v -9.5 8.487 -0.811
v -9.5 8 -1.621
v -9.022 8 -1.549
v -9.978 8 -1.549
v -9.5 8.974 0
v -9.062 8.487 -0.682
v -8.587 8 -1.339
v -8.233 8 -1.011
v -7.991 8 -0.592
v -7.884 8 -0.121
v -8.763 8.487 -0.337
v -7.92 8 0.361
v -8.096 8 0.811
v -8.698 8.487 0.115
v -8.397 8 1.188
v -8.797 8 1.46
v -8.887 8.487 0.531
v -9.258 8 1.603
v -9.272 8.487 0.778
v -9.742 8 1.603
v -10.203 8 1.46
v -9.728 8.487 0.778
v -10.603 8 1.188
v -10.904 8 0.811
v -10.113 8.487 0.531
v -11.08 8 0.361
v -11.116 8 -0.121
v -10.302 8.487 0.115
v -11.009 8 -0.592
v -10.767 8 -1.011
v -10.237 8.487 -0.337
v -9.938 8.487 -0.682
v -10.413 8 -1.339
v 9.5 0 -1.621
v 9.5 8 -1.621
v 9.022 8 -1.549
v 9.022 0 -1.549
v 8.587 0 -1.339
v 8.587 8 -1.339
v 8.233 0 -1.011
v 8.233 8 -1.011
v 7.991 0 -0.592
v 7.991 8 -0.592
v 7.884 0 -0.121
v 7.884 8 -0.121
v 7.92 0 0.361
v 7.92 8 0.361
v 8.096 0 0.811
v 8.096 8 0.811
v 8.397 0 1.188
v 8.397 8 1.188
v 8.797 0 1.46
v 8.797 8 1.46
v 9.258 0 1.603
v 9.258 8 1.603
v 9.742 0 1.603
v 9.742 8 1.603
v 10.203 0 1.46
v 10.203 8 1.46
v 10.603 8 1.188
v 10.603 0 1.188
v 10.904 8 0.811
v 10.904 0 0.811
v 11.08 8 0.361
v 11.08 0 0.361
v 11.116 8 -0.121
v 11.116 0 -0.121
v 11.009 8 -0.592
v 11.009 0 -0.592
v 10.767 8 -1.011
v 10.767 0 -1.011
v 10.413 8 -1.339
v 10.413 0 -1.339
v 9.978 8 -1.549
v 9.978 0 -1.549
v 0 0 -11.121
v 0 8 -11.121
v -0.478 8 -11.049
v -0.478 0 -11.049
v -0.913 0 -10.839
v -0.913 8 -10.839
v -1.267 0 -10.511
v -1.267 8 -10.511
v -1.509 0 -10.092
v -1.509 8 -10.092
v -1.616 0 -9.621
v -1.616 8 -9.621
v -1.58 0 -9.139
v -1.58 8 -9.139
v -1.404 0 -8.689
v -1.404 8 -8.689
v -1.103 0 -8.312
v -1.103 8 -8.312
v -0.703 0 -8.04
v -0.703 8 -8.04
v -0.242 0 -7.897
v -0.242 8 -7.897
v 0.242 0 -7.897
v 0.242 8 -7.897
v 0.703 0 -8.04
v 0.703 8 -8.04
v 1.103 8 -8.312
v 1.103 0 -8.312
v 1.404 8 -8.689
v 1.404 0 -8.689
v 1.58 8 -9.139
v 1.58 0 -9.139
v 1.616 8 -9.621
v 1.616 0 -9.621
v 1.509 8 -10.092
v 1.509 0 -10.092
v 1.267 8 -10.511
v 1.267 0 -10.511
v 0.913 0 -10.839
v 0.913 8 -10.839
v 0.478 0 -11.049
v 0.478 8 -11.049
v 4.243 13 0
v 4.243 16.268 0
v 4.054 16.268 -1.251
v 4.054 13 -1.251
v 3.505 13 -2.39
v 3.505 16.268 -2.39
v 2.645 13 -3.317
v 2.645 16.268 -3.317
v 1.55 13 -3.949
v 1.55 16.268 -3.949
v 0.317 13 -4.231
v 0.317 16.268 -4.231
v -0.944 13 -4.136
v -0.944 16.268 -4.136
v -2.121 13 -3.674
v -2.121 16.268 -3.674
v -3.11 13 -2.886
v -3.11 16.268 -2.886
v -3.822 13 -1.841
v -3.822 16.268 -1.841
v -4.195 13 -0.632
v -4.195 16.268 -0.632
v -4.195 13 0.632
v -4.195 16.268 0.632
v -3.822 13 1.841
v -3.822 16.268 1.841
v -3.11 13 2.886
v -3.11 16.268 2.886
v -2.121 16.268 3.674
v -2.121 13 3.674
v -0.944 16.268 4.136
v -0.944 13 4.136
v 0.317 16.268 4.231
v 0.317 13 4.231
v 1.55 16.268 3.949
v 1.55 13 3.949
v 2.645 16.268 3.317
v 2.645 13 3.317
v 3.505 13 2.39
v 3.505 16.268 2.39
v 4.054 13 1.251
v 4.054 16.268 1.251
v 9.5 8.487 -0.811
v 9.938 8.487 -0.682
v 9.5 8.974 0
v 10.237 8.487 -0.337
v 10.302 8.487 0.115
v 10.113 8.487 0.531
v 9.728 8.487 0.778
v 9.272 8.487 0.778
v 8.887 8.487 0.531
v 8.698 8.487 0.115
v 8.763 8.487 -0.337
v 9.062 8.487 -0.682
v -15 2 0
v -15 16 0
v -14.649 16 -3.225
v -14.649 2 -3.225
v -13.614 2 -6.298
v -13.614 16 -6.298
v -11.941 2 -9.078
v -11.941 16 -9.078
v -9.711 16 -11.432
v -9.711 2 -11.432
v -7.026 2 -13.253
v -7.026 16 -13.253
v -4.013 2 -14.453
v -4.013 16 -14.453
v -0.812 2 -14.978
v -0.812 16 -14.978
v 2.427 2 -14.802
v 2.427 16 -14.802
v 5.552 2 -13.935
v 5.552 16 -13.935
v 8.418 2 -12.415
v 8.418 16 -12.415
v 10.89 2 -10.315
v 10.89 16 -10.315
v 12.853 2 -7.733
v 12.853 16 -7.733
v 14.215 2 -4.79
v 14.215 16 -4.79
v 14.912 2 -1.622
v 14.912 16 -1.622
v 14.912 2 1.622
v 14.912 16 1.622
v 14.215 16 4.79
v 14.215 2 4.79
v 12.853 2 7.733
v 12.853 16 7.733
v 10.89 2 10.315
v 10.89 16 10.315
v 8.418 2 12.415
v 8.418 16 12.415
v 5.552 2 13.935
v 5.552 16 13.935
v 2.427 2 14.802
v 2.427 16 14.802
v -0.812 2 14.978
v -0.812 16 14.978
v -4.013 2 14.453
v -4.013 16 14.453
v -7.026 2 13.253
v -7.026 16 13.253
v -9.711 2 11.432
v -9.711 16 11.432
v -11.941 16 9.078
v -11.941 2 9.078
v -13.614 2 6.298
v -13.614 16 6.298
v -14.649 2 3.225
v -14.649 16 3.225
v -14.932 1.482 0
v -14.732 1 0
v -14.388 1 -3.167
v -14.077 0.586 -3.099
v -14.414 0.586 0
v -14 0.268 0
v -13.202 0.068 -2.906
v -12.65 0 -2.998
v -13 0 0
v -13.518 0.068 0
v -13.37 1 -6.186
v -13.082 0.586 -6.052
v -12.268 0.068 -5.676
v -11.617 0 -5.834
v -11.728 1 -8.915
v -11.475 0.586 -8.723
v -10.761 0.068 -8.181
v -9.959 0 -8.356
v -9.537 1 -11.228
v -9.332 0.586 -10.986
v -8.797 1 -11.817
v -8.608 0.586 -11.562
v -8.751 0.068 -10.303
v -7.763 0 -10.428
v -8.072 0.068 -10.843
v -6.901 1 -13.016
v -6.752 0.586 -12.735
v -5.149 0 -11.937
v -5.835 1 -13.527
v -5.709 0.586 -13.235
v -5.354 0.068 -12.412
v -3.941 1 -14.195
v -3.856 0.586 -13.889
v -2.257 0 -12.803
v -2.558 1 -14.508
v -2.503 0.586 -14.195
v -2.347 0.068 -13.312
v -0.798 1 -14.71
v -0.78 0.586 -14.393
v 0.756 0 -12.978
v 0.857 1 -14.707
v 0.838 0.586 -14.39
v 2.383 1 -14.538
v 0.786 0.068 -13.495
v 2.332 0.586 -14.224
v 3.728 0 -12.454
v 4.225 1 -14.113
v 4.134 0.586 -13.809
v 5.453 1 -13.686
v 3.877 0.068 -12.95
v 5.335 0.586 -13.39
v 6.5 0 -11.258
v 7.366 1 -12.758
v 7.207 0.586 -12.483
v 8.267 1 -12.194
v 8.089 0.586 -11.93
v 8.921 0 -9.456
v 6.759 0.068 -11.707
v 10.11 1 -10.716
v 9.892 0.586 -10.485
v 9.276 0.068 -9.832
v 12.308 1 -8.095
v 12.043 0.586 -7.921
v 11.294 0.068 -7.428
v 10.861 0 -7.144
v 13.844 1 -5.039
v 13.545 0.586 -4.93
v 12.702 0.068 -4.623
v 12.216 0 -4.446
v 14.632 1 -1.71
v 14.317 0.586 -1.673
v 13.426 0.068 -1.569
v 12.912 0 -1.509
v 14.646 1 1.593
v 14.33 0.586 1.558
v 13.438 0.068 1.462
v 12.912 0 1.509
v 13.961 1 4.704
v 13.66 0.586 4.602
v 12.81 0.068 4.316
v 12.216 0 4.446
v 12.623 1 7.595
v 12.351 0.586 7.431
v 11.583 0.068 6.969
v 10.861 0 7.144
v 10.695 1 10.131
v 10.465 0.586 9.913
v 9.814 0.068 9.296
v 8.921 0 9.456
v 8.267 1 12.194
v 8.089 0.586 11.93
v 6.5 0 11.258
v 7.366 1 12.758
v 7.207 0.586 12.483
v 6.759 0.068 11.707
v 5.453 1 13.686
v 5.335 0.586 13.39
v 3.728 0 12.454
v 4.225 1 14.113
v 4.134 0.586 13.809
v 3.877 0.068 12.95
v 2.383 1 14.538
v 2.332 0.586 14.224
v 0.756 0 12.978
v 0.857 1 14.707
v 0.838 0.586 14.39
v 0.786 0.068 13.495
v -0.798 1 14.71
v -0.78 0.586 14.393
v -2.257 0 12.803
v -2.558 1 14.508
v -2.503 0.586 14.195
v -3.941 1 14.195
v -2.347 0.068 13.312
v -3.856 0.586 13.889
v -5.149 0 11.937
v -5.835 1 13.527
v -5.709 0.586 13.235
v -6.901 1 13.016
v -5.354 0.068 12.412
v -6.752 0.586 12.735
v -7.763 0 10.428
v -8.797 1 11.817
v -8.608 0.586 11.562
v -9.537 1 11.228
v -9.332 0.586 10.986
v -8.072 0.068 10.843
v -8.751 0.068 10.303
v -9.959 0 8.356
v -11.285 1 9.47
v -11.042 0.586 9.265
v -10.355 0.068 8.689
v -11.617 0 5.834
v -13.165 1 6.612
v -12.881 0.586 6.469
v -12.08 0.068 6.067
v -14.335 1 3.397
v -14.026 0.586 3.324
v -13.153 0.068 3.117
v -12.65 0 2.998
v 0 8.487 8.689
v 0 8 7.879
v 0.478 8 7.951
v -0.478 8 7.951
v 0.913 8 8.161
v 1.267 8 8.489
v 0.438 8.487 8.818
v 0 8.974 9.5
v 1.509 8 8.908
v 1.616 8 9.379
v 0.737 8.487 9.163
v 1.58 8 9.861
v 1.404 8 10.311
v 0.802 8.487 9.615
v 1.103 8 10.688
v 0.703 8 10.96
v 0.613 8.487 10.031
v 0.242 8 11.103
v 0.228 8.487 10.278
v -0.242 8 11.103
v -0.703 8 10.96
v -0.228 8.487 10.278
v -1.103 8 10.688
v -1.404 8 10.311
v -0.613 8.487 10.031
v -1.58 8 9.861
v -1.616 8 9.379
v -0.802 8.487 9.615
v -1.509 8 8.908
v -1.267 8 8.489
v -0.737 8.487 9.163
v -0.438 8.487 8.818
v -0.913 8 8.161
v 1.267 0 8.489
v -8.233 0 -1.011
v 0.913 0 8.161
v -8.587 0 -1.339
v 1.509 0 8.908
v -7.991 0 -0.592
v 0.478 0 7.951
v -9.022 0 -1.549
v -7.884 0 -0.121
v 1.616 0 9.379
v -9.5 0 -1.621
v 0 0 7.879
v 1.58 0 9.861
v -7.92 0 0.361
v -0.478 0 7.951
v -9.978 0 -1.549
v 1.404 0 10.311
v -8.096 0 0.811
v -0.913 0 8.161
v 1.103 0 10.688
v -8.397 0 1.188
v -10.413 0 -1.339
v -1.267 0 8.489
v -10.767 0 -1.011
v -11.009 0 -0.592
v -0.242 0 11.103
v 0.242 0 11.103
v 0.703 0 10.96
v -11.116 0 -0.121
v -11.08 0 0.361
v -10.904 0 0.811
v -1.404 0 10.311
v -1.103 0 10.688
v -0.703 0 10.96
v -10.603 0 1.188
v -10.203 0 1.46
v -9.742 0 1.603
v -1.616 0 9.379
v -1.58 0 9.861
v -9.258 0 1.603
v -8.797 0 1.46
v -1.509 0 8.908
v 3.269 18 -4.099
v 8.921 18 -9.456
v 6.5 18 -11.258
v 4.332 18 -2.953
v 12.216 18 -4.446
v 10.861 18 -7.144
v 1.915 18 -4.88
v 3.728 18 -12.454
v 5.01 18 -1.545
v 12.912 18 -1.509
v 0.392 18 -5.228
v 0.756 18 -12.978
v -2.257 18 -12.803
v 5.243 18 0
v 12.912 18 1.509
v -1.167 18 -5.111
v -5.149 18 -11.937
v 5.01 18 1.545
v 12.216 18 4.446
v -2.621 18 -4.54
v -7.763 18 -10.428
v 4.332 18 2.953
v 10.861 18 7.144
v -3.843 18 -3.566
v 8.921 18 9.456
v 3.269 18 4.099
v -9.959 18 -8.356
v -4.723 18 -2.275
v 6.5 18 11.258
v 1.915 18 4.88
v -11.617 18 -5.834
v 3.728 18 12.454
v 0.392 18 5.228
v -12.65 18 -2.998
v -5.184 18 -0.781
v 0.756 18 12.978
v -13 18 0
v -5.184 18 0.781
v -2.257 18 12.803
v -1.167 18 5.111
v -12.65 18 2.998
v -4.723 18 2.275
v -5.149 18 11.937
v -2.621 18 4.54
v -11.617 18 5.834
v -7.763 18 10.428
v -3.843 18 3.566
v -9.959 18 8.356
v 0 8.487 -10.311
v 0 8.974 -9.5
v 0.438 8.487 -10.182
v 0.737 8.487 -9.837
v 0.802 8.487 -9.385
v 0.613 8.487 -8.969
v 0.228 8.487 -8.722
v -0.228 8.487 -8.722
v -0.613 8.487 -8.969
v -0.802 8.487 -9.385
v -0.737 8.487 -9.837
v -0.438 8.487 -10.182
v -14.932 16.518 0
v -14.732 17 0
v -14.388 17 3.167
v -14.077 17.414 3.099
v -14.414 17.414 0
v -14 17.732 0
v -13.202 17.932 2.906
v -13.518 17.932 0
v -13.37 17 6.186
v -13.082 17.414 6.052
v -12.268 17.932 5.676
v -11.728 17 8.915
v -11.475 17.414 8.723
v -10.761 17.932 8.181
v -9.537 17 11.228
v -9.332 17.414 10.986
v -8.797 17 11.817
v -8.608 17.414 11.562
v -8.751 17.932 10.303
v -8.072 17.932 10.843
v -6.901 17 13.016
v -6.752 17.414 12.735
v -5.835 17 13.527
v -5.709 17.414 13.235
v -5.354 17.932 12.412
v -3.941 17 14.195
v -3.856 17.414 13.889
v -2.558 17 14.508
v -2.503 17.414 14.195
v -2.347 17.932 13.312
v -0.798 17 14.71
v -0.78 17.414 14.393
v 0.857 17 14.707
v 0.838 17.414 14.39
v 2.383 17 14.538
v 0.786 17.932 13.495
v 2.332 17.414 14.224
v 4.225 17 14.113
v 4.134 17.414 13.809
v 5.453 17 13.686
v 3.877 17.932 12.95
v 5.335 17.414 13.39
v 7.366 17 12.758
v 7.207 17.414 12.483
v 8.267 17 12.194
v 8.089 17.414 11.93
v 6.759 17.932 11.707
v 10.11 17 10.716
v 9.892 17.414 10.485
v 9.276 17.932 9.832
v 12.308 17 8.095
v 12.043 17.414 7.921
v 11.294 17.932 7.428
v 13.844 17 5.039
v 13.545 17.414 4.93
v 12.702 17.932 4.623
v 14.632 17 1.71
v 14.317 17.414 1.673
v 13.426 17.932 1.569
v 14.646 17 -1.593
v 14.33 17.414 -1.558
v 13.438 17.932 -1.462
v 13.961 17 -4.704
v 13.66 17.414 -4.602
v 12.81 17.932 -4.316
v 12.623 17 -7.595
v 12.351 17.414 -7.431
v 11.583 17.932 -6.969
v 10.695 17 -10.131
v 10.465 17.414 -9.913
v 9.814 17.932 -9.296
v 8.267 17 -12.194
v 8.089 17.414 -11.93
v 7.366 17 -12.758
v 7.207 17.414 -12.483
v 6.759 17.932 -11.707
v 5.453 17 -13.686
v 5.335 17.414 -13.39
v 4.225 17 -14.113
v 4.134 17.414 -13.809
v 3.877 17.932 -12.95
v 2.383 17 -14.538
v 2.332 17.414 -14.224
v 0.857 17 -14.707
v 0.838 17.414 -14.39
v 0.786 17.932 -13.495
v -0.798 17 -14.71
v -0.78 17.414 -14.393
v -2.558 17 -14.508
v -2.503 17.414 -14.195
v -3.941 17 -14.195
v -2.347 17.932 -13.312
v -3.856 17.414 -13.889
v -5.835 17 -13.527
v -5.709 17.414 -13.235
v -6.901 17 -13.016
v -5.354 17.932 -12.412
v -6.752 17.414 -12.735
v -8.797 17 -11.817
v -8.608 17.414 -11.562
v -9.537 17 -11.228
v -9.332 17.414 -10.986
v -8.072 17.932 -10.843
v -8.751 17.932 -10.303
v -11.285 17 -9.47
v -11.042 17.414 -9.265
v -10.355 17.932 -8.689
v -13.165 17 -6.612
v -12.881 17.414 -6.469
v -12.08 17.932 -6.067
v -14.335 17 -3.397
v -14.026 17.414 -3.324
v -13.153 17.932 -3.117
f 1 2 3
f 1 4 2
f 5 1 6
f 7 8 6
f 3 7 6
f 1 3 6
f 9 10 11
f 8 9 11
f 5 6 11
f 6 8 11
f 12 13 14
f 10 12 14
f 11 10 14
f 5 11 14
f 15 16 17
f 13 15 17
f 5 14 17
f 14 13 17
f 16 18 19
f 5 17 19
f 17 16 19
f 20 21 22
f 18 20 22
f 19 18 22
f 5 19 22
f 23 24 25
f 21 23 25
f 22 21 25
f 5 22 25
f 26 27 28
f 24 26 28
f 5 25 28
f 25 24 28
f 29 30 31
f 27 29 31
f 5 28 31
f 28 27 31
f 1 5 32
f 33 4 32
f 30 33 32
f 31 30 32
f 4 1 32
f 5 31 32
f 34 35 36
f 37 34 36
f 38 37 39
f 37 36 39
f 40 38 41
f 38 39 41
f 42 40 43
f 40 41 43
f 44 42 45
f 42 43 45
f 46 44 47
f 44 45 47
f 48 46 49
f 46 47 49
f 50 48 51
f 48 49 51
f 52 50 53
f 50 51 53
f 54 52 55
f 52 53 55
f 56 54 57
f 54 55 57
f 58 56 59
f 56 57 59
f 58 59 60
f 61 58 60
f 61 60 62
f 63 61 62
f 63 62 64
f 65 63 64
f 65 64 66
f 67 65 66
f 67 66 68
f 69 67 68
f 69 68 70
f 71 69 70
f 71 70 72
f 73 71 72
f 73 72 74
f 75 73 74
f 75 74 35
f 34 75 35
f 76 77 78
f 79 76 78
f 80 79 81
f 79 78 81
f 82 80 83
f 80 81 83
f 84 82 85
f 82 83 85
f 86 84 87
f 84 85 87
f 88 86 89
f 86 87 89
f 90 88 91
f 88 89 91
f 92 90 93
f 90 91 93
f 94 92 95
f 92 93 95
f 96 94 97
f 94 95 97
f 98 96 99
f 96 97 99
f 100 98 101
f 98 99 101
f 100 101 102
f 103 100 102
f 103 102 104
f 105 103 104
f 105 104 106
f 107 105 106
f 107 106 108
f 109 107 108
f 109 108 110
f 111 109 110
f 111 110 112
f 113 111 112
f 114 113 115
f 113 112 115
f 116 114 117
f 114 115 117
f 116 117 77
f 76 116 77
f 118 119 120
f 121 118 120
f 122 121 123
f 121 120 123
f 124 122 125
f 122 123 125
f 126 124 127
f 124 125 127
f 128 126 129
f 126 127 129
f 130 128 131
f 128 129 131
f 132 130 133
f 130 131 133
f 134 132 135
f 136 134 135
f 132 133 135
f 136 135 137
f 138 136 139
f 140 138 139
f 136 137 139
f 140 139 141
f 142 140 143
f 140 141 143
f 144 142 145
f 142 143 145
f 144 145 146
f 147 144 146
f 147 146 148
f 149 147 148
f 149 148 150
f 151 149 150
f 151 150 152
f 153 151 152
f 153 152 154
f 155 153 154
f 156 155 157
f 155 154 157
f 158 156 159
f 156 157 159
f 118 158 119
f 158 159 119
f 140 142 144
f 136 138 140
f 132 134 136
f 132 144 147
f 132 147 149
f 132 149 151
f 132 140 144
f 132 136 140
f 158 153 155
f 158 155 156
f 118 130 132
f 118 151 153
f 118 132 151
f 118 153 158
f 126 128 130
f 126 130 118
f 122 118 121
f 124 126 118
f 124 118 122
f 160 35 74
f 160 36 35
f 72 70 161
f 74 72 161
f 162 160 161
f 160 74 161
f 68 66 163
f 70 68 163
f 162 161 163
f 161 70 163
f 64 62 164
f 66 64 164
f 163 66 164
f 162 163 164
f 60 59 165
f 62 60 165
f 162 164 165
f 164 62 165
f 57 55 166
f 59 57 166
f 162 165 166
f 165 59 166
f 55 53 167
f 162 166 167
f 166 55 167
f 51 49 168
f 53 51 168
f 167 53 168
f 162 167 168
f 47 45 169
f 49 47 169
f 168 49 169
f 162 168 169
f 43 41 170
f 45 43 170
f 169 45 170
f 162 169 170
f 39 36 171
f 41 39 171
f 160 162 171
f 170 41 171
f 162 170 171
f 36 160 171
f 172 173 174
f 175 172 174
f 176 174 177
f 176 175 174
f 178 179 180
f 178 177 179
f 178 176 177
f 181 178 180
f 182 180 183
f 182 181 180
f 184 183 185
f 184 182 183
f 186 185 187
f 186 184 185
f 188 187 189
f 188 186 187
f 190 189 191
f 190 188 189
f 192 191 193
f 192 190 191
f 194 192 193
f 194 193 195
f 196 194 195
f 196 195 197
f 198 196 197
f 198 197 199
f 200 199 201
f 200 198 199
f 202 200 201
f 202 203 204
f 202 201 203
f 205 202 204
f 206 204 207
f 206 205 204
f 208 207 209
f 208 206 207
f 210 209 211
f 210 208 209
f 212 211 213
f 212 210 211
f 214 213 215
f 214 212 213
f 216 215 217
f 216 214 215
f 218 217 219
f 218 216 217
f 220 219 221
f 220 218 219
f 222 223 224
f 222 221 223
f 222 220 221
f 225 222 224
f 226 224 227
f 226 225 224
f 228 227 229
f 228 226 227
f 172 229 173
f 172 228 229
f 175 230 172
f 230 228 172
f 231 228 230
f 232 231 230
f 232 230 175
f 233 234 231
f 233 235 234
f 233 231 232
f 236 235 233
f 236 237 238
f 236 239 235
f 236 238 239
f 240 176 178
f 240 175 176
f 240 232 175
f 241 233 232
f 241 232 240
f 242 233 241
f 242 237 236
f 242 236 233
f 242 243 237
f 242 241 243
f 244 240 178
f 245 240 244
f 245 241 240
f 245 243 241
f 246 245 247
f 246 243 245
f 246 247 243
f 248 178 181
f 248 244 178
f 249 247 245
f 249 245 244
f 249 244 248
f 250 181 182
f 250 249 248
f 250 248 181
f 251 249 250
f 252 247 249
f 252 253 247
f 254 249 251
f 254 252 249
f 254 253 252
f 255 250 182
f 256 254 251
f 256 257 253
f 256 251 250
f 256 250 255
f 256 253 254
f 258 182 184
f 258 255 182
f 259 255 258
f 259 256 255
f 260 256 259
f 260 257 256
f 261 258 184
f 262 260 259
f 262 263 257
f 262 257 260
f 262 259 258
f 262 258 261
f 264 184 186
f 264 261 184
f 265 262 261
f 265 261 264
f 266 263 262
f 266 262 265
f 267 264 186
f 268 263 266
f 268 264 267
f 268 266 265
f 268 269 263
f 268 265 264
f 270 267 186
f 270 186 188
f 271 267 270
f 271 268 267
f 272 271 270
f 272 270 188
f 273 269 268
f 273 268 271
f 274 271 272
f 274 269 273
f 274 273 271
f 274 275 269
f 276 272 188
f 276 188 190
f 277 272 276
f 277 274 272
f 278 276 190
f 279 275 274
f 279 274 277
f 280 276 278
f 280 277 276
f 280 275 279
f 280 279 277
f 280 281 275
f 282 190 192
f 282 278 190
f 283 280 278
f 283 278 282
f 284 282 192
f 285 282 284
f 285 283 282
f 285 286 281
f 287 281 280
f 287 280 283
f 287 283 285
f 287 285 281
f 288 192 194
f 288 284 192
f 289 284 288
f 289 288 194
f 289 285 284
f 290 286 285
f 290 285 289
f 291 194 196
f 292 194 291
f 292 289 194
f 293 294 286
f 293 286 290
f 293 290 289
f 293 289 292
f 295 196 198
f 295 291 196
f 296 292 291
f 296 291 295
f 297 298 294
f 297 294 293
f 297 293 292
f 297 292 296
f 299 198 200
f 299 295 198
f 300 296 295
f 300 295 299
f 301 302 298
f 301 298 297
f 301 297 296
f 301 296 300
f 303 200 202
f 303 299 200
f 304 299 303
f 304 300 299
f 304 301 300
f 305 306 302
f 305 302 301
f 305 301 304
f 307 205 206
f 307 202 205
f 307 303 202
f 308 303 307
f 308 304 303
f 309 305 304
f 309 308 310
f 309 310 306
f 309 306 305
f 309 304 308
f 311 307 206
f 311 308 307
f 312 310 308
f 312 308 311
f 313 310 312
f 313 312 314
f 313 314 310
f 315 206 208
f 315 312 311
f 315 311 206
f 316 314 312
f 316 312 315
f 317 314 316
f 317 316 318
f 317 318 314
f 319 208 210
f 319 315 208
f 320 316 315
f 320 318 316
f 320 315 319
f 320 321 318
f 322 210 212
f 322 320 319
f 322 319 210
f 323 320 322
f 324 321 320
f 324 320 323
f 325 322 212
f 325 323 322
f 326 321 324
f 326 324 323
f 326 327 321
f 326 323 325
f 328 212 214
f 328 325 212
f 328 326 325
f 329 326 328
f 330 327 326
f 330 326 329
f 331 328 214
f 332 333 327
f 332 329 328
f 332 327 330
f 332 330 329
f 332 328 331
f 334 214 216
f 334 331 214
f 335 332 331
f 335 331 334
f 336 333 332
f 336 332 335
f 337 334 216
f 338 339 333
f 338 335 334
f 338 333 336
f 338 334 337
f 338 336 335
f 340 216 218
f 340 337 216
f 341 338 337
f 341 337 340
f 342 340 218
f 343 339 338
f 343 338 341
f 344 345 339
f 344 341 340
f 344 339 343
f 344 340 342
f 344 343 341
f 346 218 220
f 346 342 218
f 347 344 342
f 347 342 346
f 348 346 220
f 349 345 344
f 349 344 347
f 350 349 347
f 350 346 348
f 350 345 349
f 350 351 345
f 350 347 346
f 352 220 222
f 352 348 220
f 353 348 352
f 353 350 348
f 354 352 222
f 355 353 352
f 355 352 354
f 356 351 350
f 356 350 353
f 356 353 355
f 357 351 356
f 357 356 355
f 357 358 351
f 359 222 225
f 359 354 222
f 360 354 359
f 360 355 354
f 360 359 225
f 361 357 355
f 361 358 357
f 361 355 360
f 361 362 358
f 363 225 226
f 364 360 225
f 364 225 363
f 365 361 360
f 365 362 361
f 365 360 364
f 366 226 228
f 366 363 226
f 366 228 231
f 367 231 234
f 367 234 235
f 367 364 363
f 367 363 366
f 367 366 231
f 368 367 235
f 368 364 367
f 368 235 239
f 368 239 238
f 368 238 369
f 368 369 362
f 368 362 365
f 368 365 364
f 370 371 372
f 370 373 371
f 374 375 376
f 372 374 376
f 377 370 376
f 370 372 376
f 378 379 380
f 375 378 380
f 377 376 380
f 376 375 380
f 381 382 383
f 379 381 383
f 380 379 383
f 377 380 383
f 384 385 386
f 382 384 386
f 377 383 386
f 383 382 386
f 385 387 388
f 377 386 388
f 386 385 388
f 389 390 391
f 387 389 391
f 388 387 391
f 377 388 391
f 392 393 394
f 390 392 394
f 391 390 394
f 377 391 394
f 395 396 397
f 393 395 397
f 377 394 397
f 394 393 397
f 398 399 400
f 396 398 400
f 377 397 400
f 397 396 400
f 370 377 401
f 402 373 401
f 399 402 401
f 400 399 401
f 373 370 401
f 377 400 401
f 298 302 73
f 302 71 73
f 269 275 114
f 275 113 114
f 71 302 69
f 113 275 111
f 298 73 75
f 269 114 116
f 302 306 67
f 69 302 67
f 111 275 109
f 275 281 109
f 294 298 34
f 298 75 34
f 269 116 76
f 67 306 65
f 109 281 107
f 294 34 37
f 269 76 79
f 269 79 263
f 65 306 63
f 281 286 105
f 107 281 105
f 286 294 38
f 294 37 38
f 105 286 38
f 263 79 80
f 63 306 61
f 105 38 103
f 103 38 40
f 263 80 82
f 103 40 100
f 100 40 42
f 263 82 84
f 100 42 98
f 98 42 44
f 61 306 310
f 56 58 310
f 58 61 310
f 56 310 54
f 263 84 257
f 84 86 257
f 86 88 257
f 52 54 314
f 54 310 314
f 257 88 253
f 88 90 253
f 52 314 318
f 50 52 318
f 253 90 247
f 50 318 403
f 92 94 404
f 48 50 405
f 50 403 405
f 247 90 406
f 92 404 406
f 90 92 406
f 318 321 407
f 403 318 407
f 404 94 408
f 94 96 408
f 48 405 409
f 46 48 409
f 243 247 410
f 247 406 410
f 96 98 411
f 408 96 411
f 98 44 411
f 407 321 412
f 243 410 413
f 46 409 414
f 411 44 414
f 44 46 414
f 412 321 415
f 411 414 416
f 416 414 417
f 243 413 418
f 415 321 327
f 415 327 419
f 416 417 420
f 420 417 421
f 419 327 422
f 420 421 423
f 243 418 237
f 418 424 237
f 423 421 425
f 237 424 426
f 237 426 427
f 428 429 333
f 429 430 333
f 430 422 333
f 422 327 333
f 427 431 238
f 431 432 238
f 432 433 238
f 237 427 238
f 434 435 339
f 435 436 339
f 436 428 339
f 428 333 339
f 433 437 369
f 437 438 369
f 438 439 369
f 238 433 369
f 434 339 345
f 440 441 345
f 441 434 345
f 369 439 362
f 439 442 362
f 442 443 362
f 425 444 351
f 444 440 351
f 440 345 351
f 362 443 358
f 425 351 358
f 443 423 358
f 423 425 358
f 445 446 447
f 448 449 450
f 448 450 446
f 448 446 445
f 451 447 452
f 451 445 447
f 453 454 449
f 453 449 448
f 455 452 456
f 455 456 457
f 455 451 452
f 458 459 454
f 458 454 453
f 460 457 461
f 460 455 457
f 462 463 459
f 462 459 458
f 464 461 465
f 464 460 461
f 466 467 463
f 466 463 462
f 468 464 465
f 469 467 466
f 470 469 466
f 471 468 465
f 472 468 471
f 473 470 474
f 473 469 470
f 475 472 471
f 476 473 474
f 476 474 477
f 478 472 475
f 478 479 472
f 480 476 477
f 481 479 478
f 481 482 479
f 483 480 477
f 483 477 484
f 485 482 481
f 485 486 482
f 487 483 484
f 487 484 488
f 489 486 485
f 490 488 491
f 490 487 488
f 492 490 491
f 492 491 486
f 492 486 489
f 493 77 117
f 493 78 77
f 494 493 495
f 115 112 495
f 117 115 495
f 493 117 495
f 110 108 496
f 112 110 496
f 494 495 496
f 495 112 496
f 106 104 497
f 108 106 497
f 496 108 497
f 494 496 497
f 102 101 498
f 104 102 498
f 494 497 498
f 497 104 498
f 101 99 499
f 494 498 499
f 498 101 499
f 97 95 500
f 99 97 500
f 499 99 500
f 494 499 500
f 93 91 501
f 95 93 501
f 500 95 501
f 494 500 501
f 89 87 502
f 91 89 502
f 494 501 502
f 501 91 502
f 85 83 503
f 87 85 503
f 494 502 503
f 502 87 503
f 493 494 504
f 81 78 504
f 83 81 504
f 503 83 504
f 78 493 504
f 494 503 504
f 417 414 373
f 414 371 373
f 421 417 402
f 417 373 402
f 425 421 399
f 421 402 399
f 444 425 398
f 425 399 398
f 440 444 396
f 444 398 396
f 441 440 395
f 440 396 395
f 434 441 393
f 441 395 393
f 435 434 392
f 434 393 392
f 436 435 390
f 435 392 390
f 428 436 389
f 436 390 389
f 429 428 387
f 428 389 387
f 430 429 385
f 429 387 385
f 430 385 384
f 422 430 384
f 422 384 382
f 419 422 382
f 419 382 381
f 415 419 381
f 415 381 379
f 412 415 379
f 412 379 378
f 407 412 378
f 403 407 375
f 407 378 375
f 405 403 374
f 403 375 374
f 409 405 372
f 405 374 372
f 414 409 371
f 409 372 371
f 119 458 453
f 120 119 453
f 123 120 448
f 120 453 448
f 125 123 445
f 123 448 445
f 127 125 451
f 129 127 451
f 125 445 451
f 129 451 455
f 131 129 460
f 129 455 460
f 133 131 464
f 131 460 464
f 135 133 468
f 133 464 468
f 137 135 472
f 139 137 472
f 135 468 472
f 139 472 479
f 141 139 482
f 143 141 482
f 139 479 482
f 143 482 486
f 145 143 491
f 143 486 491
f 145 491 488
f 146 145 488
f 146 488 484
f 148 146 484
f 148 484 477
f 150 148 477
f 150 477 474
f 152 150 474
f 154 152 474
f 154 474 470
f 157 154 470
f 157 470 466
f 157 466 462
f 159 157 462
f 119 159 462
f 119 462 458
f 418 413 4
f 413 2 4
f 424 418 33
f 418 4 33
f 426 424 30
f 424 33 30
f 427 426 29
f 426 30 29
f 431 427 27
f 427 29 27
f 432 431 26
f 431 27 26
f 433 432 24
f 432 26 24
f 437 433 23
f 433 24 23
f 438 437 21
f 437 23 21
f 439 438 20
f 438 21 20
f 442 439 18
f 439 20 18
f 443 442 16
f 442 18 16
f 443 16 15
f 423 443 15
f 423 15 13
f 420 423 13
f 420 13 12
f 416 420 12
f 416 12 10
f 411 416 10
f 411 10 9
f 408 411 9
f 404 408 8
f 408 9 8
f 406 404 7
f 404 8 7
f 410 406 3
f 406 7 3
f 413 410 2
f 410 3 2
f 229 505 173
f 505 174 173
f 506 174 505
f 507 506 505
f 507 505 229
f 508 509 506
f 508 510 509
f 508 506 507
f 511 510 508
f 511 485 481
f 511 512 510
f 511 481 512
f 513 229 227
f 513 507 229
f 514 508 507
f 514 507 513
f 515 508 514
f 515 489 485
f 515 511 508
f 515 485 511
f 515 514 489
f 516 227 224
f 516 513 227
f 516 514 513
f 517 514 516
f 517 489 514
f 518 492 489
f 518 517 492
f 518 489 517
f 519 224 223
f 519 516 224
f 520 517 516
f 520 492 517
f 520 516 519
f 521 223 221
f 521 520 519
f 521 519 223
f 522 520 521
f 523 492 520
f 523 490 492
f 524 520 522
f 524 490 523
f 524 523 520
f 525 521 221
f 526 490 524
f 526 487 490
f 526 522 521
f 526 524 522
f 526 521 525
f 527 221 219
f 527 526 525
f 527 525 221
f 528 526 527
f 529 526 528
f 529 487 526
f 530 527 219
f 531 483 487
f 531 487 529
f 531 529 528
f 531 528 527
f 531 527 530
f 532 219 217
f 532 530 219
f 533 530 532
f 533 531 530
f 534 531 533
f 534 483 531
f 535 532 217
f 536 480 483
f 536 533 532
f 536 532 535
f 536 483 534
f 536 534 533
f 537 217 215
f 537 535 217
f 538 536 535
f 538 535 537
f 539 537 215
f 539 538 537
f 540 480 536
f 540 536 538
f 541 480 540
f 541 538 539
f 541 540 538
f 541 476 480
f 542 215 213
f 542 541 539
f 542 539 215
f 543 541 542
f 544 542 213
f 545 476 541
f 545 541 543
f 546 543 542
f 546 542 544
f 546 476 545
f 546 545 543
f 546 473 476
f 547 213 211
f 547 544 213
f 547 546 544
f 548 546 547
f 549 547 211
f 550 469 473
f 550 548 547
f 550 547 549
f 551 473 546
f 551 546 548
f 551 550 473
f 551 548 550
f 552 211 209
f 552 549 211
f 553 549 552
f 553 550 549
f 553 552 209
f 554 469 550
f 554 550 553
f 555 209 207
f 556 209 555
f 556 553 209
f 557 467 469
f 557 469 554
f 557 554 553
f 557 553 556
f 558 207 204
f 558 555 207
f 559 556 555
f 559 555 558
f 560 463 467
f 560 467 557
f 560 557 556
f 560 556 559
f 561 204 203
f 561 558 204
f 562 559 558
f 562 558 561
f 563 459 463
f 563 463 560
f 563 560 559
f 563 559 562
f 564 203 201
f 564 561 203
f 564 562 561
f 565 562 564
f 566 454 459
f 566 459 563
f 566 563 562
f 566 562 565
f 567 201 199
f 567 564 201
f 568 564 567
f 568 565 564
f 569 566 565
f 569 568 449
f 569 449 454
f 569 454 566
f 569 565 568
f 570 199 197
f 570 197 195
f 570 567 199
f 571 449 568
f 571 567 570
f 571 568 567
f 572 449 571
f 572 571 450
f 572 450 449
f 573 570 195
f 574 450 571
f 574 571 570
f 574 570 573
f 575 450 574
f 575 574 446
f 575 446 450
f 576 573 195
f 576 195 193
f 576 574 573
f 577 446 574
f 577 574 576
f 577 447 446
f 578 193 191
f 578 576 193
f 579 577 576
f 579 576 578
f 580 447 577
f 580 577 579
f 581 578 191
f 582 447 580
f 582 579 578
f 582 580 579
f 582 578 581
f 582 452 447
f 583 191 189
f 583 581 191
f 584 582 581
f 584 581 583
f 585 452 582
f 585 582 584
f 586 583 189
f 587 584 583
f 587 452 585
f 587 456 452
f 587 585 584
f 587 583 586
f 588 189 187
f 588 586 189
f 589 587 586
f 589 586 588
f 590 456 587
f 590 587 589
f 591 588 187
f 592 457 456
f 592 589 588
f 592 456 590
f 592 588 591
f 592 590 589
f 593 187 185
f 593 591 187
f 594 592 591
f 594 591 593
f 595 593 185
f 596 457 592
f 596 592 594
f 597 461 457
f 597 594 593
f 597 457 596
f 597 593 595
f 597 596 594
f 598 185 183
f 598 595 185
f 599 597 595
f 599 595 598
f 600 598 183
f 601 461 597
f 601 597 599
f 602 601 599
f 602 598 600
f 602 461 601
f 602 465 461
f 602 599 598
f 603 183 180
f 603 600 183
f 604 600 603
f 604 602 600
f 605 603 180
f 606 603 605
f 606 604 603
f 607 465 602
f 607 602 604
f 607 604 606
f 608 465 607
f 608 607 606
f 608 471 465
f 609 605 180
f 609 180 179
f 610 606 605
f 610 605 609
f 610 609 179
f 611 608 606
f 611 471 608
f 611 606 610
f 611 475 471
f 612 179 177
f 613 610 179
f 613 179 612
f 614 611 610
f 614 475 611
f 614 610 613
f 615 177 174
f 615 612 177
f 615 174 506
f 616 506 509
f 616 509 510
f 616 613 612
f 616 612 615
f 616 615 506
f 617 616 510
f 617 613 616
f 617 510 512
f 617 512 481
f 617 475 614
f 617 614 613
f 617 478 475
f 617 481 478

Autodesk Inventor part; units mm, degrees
ref_plane "YZ Plane" through (0, 0, 0) normal (1, 0, 0) x (0, 1, 0)
ref_plane "XZ Plane" through (0, 0, 0) normal (0, 1, 0) x (-1, 0, 0)
ref_plane "XY Plane" through (0, 0, 0) normal (0, 0, 1) x (1, 0, 0)
sketch "Sketch1" plane through (0, 0, 0) normal (0, 1, 0) x (-1, 0, 0)
  circle A0 centre (0, 0) radius 15
  dimension "d0" = 30
extrude "Extrusion1" add sketch "Sketch1" along normal blind 18
fillet "Fillet1" radius 2 2 edges at (15, 18, 0) (15, 0, 0)
sketch "Sketch4" plane through (0, 0, 0) normal (0, -1, 0) x (1, 0, 0)
  circle A0 centre (0, 0) radius 9.5 construction
  point P0 (0, 9.5)
  point P1 (0, -9.5)
  point P2 (-9.5, 0)
  point P3 (9.5, 0)
  dimension "d16" = 19
hole "Hole1" at (0, 0, 9.5) at (0, 0, -9.5) at (-9.5, 0, 0) at (9.5, 0, 0) direction (0, 1, 0) diameter 3.242 depth 8 tip angle 118 thread size "M4x0.7" class "6H" standard "ISO Metric profile"
sketch "Sketch6" plane through (0, 18, 0) normal (0, 1, 0) x (1, 0, 0)
  line L0 (-3, 3) -> (3, 3) construction
  line L1 (3, 3) -> (3, -3) construction
  line L2 (3, -3) -> (-3, -3) construction
  line L3 (-3, -3) -> (-3, 3) construction
  circle A0 centre (0, 0) radius 4.2426
  dimension "d30" = 6
  dimension "d31" = 6
  dimension "d32" = 3
  dimension "d33" = 3
extrude "Extrusion6" cut sketch "Sketch6" against normal blind 5
chamfer "Chamfer1" distance 1 angle 60 1 edges at (-4.2426, 18, 0) measured on face at (-9.9139, 18, -1.3755)
properties part number "Motor"
